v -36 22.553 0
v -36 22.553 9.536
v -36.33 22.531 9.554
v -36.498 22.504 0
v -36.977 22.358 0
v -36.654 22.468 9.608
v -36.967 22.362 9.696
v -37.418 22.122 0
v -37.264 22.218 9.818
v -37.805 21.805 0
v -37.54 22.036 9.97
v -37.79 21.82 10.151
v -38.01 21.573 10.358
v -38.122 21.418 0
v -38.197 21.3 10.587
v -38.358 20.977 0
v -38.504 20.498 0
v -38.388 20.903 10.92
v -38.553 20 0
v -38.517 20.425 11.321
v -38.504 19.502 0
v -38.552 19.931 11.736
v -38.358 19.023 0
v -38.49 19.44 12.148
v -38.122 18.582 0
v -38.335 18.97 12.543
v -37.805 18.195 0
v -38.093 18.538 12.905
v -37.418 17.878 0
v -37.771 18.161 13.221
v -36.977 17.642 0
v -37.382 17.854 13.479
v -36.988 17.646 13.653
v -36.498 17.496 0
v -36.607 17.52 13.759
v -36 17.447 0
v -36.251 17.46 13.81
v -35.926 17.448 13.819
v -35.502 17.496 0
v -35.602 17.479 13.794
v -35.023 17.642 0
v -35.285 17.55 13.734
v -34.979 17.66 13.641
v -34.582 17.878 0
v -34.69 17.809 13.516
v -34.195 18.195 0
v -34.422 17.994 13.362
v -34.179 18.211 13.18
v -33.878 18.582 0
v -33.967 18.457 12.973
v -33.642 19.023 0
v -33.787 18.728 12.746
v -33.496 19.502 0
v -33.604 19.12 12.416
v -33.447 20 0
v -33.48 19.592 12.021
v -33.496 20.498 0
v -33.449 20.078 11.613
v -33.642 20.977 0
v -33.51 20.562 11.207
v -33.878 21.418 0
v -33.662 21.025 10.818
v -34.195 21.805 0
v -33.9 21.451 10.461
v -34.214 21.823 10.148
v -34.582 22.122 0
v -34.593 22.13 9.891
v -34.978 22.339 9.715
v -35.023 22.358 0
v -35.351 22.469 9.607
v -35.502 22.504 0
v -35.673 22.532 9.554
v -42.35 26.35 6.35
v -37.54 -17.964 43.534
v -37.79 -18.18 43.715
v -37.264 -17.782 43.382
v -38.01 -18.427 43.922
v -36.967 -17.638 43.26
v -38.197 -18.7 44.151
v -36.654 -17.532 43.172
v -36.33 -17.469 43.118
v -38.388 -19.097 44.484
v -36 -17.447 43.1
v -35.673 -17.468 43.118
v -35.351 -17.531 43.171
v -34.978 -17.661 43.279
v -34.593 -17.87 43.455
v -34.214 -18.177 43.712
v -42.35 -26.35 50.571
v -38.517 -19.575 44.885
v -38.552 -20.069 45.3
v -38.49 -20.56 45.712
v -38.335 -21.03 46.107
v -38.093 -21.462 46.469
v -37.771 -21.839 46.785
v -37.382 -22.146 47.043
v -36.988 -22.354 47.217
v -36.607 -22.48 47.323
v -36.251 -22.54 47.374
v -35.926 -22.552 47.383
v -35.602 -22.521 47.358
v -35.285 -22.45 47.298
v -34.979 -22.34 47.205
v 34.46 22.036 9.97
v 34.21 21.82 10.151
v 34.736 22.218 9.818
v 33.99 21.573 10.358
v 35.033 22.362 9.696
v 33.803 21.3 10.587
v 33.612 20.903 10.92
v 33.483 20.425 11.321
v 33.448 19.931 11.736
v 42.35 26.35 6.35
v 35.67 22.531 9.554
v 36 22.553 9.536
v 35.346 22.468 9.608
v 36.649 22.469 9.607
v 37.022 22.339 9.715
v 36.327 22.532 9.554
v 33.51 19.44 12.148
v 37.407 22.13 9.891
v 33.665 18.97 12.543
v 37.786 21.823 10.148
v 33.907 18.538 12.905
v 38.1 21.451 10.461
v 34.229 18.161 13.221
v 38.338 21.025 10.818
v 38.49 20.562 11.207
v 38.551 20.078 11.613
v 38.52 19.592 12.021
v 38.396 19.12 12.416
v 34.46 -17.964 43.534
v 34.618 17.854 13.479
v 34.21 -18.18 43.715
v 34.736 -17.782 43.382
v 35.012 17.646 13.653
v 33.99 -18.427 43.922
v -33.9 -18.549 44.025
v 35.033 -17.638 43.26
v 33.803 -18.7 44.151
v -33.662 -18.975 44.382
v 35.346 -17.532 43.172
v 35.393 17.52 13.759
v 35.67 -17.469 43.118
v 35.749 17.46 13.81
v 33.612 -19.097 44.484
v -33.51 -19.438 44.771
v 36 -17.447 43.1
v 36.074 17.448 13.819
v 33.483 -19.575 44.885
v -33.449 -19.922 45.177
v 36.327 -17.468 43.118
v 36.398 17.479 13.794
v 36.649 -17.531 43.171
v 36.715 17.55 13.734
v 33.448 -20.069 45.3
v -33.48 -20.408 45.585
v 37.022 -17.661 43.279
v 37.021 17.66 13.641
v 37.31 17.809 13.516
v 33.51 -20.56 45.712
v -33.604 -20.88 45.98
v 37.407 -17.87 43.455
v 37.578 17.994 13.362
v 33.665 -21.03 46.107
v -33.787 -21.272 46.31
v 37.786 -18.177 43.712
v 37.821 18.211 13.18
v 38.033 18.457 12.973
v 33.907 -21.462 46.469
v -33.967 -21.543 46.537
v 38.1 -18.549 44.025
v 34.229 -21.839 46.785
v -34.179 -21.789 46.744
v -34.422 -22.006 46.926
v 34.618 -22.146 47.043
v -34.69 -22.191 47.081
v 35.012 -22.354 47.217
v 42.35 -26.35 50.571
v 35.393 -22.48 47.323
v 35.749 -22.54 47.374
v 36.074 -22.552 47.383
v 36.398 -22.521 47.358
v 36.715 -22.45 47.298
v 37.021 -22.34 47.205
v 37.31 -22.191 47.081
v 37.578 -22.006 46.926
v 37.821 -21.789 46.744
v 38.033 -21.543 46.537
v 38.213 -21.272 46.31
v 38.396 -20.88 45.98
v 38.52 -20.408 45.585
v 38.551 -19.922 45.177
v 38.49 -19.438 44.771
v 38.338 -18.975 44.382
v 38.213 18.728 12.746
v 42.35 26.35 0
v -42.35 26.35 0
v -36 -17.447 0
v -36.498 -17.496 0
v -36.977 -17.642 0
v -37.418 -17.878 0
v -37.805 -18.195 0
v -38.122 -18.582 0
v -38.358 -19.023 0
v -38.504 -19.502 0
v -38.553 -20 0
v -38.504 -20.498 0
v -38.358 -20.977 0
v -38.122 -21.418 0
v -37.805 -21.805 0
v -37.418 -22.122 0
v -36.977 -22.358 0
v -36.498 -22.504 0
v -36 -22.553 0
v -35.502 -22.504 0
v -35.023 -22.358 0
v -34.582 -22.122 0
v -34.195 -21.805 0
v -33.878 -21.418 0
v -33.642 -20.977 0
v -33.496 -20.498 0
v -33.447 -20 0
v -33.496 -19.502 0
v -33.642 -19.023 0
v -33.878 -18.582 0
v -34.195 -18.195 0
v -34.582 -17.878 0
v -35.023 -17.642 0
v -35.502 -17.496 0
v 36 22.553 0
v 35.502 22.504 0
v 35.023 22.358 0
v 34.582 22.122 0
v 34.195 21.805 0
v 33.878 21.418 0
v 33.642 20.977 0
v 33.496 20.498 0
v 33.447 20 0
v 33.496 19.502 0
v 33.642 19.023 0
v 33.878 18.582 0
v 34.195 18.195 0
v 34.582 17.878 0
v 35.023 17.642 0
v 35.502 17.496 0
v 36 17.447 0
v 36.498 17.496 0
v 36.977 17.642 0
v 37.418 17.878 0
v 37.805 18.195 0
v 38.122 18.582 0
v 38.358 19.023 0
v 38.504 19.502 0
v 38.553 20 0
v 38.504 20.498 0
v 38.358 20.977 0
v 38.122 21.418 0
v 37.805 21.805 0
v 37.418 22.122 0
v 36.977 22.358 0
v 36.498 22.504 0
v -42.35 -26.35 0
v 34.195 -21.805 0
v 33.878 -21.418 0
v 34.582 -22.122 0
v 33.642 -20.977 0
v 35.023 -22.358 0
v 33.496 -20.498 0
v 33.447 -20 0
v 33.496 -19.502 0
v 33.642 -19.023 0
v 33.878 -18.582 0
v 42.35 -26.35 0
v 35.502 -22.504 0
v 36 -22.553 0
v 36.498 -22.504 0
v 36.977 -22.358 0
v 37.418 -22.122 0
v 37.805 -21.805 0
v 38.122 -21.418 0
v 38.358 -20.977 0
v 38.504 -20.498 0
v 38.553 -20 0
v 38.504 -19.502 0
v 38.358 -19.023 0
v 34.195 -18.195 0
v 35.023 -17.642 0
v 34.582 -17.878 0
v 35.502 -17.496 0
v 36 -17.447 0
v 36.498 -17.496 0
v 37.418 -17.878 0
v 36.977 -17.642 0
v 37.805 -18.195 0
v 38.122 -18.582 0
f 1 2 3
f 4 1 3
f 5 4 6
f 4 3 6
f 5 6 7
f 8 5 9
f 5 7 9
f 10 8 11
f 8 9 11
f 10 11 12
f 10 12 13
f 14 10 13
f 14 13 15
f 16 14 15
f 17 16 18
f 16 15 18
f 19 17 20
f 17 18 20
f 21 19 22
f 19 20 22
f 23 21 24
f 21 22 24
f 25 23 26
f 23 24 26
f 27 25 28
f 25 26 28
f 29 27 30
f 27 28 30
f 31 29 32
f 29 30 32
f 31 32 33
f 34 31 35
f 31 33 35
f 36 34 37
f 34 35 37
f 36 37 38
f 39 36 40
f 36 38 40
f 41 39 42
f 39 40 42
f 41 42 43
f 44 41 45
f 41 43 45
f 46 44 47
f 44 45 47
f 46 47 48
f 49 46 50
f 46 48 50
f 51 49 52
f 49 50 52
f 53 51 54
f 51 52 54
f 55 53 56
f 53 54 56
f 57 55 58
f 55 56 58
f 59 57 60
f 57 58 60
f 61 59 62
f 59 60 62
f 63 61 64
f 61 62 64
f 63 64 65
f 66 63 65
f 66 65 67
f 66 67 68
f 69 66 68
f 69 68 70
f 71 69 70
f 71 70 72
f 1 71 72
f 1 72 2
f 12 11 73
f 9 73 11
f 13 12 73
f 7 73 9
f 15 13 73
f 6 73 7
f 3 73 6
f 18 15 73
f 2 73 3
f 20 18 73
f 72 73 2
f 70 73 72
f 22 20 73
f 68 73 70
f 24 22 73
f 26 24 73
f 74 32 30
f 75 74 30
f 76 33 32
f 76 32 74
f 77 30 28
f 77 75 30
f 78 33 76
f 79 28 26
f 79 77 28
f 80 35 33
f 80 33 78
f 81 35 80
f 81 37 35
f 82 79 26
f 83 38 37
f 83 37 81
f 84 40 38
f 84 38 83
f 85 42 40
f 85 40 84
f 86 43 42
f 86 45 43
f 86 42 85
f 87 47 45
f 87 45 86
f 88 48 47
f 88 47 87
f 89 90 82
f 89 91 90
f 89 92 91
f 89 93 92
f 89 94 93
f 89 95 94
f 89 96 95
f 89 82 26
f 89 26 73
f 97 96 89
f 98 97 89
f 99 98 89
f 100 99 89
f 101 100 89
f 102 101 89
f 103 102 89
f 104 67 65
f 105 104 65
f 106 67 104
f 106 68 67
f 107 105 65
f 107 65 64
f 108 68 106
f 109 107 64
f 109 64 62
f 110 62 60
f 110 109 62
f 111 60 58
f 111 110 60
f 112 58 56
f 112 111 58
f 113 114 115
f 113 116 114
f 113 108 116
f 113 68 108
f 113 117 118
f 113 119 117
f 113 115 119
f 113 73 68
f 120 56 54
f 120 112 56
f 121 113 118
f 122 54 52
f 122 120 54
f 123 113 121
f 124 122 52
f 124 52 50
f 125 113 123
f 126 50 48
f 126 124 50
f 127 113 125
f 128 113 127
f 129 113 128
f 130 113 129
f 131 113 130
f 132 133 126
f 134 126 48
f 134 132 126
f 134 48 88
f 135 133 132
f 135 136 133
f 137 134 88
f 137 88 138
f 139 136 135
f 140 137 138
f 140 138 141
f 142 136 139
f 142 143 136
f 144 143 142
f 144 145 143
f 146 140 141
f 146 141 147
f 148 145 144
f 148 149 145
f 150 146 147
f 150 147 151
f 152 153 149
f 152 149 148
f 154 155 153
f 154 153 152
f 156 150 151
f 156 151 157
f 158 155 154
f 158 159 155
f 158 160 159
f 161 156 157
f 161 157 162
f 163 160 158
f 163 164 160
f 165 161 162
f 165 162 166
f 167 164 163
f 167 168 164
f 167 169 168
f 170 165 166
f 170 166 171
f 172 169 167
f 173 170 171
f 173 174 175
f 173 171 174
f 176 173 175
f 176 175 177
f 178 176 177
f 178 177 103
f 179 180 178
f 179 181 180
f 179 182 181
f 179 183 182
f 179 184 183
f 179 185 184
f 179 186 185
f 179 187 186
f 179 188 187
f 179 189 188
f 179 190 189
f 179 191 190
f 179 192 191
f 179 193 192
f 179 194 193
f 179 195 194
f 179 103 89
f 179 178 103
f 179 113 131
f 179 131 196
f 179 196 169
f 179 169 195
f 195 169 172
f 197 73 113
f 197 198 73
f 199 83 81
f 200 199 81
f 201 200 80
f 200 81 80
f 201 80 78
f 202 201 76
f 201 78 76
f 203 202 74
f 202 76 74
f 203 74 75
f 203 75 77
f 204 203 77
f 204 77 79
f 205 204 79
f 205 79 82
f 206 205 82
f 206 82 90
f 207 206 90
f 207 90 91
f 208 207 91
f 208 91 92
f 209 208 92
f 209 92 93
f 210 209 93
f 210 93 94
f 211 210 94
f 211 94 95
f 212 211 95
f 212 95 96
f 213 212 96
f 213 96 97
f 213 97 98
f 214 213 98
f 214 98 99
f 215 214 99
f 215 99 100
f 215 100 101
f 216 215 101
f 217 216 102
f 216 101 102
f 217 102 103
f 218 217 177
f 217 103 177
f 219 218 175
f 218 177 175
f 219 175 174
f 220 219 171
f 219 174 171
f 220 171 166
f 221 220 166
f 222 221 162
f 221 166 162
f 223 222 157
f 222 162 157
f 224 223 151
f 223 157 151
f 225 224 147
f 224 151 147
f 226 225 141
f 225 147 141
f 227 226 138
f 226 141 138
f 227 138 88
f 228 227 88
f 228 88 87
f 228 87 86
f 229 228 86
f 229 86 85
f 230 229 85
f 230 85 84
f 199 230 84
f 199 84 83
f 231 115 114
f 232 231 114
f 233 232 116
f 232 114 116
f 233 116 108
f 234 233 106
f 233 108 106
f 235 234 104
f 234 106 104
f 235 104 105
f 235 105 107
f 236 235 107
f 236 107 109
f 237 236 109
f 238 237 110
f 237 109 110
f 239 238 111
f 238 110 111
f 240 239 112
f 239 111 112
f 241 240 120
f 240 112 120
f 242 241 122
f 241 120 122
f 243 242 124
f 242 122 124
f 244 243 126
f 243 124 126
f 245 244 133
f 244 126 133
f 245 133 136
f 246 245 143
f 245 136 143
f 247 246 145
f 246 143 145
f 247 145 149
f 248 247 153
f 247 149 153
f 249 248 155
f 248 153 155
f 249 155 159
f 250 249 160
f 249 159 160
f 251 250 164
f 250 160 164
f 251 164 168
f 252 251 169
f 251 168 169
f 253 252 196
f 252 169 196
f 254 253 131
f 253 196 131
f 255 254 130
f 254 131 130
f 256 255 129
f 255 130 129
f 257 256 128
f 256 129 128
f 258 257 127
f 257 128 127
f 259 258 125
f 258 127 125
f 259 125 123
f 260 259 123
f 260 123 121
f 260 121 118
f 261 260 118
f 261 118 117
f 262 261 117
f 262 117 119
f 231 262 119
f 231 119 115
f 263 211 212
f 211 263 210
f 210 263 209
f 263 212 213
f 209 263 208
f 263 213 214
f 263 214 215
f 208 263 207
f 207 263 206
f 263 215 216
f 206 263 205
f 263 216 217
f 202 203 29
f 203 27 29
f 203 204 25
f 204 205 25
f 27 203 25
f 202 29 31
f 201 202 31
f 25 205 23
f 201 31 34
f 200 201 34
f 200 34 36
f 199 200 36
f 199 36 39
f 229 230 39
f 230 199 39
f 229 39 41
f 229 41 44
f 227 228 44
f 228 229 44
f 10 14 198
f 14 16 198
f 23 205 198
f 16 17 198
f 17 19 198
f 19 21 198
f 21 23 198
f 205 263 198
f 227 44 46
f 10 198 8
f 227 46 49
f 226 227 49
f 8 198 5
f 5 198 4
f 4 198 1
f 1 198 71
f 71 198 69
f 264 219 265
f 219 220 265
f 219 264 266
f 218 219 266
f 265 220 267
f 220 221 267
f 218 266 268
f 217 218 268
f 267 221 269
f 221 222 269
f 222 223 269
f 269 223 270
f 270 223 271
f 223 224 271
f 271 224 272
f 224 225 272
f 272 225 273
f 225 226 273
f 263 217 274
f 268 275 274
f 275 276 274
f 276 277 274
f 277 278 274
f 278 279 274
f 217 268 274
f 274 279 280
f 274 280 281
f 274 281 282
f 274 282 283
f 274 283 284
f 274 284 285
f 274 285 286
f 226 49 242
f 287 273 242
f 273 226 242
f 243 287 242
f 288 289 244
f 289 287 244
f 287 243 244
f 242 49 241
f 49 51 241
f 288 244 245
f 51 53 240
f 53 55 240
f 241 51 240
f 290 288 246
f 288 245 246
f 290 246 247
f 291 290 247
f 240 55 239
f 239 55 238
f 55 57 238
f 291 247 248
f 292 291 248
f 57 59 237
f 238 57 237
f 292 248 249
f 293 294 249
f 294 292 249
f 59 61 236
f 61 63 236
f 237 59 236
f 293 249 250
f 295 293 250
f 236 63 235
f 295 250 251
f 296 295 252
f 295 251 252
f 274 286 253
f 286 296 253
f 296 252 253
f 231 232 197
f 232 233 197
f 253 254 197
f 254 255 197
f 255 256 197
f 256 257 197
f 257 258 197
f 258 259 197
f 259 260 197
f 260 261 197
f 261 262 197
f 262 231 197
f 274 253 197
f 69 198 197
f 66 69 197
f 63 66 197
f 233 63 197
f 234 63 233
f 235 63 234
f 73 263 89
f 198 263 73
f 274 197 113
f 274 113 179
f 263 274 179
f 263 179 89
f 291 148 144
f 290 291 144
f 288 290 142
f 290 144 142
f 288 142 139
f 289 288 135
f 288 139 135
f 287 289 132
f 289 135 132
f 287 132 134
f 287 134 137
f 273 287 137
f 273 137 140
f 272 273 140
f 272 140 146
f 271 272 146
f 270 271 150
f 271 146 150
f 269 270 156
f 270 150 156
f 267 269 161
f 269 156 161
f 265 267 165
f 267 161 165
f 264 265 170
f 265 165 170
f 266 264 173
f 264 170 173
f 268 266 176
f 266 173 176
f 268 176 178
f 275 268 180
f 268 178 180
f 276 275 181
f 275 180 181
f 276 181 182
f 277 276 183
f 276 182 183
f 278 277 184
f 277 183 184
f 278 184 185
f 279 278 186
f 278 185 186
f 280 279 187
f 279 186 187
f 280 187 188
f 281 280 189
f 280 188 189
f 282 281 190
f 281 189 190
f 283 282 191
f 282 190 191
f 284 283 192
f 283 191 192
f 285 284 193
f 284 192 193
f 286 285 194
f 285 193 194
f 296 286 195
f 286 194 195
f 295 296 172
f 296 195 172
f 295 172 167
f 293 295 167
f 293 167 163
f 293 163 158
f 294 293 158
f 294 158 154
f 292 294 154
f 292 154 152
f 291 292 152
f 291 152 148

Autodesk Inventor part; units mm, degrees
ref_plane "YZ Plane" through (0, 0, 0) normal (1, 0, 0) x (0, 1, 0)
ref_plane "XZ Plane" through (0, 0, 0) normal (0, 1, 0) x (-1, 0, 0)
ref_plane "XY Plane" through (0, 0, 0) normal (0, 0, 1) x (1, 0, 0)
sketch "Sketch1" plane through (0, 0, 0) normal (0, 0, 1) x (1, 0, 0)
  line L0 (36, -20) -> (-36, -20) construction
  line L1 (-36, -20) -> (-36, 20) construction
  line L2 (-36, 20) -> (36, 20) construction
  line L3 (36, 20) -> (36, -20) construction
  line L4 (36, -20) -> (-36, 20) construction
  line L5 (-36, -20) -> (36, 20) construction
  line L6 (42.35, -26.35) -> (-42.35, -26.35)
  line L7 (-42.35, -26.35) -> (-42.35, 26.35)
  line L8 (-42.35, 26.35) -> (42.35, 26.35)
  line L9 (42.35, 26.35) -> (42.35, -26.35)
  line L10 (42.35, -26.35) -> (-42.35, 26.35) construction
  line L11 (-42.35, -26.35) -> (42.35, 26.35) construction
  point P0 (0, 0)
  dimension "d0" = 72
  dimension "d1" = 40
  dimension "d2" = 6.35
  dimension "d3" = 6.35
extrude "Extrusion1" add sketch "Sketch1" along normal blind 6.35
sketch "Sketch2" plane through (42.35, -26.35, 0) normal (1, 0, 0) x (0, 0, -1)
  line L0 (-6.35, 0) -> (-6.35, 52.7) projected
  line L1 (-6.35, 52.7) -> (-50.5706, 0)
  line L2 (-50.5706, 0) -> (-6.35, 0)
  point P0 (0, 26.35)
  dimension "d13" = 40
extrude "Extrusion2" add sketch "Sketch2" against normal up to surface (84.7 mm away)
hole "Hole2" at (-36, 20, 0) at (-36, -20, 0) at (36, -20, 0) at (36, 20, 0) direction (0, 0, 1) diameter 5.1054 end through all clearance for "Socket Head Cap Screw" size "#10" standard "Ansi Unified Screw Threads"
properties part number "limelight mount" material "ABS Plastic"
